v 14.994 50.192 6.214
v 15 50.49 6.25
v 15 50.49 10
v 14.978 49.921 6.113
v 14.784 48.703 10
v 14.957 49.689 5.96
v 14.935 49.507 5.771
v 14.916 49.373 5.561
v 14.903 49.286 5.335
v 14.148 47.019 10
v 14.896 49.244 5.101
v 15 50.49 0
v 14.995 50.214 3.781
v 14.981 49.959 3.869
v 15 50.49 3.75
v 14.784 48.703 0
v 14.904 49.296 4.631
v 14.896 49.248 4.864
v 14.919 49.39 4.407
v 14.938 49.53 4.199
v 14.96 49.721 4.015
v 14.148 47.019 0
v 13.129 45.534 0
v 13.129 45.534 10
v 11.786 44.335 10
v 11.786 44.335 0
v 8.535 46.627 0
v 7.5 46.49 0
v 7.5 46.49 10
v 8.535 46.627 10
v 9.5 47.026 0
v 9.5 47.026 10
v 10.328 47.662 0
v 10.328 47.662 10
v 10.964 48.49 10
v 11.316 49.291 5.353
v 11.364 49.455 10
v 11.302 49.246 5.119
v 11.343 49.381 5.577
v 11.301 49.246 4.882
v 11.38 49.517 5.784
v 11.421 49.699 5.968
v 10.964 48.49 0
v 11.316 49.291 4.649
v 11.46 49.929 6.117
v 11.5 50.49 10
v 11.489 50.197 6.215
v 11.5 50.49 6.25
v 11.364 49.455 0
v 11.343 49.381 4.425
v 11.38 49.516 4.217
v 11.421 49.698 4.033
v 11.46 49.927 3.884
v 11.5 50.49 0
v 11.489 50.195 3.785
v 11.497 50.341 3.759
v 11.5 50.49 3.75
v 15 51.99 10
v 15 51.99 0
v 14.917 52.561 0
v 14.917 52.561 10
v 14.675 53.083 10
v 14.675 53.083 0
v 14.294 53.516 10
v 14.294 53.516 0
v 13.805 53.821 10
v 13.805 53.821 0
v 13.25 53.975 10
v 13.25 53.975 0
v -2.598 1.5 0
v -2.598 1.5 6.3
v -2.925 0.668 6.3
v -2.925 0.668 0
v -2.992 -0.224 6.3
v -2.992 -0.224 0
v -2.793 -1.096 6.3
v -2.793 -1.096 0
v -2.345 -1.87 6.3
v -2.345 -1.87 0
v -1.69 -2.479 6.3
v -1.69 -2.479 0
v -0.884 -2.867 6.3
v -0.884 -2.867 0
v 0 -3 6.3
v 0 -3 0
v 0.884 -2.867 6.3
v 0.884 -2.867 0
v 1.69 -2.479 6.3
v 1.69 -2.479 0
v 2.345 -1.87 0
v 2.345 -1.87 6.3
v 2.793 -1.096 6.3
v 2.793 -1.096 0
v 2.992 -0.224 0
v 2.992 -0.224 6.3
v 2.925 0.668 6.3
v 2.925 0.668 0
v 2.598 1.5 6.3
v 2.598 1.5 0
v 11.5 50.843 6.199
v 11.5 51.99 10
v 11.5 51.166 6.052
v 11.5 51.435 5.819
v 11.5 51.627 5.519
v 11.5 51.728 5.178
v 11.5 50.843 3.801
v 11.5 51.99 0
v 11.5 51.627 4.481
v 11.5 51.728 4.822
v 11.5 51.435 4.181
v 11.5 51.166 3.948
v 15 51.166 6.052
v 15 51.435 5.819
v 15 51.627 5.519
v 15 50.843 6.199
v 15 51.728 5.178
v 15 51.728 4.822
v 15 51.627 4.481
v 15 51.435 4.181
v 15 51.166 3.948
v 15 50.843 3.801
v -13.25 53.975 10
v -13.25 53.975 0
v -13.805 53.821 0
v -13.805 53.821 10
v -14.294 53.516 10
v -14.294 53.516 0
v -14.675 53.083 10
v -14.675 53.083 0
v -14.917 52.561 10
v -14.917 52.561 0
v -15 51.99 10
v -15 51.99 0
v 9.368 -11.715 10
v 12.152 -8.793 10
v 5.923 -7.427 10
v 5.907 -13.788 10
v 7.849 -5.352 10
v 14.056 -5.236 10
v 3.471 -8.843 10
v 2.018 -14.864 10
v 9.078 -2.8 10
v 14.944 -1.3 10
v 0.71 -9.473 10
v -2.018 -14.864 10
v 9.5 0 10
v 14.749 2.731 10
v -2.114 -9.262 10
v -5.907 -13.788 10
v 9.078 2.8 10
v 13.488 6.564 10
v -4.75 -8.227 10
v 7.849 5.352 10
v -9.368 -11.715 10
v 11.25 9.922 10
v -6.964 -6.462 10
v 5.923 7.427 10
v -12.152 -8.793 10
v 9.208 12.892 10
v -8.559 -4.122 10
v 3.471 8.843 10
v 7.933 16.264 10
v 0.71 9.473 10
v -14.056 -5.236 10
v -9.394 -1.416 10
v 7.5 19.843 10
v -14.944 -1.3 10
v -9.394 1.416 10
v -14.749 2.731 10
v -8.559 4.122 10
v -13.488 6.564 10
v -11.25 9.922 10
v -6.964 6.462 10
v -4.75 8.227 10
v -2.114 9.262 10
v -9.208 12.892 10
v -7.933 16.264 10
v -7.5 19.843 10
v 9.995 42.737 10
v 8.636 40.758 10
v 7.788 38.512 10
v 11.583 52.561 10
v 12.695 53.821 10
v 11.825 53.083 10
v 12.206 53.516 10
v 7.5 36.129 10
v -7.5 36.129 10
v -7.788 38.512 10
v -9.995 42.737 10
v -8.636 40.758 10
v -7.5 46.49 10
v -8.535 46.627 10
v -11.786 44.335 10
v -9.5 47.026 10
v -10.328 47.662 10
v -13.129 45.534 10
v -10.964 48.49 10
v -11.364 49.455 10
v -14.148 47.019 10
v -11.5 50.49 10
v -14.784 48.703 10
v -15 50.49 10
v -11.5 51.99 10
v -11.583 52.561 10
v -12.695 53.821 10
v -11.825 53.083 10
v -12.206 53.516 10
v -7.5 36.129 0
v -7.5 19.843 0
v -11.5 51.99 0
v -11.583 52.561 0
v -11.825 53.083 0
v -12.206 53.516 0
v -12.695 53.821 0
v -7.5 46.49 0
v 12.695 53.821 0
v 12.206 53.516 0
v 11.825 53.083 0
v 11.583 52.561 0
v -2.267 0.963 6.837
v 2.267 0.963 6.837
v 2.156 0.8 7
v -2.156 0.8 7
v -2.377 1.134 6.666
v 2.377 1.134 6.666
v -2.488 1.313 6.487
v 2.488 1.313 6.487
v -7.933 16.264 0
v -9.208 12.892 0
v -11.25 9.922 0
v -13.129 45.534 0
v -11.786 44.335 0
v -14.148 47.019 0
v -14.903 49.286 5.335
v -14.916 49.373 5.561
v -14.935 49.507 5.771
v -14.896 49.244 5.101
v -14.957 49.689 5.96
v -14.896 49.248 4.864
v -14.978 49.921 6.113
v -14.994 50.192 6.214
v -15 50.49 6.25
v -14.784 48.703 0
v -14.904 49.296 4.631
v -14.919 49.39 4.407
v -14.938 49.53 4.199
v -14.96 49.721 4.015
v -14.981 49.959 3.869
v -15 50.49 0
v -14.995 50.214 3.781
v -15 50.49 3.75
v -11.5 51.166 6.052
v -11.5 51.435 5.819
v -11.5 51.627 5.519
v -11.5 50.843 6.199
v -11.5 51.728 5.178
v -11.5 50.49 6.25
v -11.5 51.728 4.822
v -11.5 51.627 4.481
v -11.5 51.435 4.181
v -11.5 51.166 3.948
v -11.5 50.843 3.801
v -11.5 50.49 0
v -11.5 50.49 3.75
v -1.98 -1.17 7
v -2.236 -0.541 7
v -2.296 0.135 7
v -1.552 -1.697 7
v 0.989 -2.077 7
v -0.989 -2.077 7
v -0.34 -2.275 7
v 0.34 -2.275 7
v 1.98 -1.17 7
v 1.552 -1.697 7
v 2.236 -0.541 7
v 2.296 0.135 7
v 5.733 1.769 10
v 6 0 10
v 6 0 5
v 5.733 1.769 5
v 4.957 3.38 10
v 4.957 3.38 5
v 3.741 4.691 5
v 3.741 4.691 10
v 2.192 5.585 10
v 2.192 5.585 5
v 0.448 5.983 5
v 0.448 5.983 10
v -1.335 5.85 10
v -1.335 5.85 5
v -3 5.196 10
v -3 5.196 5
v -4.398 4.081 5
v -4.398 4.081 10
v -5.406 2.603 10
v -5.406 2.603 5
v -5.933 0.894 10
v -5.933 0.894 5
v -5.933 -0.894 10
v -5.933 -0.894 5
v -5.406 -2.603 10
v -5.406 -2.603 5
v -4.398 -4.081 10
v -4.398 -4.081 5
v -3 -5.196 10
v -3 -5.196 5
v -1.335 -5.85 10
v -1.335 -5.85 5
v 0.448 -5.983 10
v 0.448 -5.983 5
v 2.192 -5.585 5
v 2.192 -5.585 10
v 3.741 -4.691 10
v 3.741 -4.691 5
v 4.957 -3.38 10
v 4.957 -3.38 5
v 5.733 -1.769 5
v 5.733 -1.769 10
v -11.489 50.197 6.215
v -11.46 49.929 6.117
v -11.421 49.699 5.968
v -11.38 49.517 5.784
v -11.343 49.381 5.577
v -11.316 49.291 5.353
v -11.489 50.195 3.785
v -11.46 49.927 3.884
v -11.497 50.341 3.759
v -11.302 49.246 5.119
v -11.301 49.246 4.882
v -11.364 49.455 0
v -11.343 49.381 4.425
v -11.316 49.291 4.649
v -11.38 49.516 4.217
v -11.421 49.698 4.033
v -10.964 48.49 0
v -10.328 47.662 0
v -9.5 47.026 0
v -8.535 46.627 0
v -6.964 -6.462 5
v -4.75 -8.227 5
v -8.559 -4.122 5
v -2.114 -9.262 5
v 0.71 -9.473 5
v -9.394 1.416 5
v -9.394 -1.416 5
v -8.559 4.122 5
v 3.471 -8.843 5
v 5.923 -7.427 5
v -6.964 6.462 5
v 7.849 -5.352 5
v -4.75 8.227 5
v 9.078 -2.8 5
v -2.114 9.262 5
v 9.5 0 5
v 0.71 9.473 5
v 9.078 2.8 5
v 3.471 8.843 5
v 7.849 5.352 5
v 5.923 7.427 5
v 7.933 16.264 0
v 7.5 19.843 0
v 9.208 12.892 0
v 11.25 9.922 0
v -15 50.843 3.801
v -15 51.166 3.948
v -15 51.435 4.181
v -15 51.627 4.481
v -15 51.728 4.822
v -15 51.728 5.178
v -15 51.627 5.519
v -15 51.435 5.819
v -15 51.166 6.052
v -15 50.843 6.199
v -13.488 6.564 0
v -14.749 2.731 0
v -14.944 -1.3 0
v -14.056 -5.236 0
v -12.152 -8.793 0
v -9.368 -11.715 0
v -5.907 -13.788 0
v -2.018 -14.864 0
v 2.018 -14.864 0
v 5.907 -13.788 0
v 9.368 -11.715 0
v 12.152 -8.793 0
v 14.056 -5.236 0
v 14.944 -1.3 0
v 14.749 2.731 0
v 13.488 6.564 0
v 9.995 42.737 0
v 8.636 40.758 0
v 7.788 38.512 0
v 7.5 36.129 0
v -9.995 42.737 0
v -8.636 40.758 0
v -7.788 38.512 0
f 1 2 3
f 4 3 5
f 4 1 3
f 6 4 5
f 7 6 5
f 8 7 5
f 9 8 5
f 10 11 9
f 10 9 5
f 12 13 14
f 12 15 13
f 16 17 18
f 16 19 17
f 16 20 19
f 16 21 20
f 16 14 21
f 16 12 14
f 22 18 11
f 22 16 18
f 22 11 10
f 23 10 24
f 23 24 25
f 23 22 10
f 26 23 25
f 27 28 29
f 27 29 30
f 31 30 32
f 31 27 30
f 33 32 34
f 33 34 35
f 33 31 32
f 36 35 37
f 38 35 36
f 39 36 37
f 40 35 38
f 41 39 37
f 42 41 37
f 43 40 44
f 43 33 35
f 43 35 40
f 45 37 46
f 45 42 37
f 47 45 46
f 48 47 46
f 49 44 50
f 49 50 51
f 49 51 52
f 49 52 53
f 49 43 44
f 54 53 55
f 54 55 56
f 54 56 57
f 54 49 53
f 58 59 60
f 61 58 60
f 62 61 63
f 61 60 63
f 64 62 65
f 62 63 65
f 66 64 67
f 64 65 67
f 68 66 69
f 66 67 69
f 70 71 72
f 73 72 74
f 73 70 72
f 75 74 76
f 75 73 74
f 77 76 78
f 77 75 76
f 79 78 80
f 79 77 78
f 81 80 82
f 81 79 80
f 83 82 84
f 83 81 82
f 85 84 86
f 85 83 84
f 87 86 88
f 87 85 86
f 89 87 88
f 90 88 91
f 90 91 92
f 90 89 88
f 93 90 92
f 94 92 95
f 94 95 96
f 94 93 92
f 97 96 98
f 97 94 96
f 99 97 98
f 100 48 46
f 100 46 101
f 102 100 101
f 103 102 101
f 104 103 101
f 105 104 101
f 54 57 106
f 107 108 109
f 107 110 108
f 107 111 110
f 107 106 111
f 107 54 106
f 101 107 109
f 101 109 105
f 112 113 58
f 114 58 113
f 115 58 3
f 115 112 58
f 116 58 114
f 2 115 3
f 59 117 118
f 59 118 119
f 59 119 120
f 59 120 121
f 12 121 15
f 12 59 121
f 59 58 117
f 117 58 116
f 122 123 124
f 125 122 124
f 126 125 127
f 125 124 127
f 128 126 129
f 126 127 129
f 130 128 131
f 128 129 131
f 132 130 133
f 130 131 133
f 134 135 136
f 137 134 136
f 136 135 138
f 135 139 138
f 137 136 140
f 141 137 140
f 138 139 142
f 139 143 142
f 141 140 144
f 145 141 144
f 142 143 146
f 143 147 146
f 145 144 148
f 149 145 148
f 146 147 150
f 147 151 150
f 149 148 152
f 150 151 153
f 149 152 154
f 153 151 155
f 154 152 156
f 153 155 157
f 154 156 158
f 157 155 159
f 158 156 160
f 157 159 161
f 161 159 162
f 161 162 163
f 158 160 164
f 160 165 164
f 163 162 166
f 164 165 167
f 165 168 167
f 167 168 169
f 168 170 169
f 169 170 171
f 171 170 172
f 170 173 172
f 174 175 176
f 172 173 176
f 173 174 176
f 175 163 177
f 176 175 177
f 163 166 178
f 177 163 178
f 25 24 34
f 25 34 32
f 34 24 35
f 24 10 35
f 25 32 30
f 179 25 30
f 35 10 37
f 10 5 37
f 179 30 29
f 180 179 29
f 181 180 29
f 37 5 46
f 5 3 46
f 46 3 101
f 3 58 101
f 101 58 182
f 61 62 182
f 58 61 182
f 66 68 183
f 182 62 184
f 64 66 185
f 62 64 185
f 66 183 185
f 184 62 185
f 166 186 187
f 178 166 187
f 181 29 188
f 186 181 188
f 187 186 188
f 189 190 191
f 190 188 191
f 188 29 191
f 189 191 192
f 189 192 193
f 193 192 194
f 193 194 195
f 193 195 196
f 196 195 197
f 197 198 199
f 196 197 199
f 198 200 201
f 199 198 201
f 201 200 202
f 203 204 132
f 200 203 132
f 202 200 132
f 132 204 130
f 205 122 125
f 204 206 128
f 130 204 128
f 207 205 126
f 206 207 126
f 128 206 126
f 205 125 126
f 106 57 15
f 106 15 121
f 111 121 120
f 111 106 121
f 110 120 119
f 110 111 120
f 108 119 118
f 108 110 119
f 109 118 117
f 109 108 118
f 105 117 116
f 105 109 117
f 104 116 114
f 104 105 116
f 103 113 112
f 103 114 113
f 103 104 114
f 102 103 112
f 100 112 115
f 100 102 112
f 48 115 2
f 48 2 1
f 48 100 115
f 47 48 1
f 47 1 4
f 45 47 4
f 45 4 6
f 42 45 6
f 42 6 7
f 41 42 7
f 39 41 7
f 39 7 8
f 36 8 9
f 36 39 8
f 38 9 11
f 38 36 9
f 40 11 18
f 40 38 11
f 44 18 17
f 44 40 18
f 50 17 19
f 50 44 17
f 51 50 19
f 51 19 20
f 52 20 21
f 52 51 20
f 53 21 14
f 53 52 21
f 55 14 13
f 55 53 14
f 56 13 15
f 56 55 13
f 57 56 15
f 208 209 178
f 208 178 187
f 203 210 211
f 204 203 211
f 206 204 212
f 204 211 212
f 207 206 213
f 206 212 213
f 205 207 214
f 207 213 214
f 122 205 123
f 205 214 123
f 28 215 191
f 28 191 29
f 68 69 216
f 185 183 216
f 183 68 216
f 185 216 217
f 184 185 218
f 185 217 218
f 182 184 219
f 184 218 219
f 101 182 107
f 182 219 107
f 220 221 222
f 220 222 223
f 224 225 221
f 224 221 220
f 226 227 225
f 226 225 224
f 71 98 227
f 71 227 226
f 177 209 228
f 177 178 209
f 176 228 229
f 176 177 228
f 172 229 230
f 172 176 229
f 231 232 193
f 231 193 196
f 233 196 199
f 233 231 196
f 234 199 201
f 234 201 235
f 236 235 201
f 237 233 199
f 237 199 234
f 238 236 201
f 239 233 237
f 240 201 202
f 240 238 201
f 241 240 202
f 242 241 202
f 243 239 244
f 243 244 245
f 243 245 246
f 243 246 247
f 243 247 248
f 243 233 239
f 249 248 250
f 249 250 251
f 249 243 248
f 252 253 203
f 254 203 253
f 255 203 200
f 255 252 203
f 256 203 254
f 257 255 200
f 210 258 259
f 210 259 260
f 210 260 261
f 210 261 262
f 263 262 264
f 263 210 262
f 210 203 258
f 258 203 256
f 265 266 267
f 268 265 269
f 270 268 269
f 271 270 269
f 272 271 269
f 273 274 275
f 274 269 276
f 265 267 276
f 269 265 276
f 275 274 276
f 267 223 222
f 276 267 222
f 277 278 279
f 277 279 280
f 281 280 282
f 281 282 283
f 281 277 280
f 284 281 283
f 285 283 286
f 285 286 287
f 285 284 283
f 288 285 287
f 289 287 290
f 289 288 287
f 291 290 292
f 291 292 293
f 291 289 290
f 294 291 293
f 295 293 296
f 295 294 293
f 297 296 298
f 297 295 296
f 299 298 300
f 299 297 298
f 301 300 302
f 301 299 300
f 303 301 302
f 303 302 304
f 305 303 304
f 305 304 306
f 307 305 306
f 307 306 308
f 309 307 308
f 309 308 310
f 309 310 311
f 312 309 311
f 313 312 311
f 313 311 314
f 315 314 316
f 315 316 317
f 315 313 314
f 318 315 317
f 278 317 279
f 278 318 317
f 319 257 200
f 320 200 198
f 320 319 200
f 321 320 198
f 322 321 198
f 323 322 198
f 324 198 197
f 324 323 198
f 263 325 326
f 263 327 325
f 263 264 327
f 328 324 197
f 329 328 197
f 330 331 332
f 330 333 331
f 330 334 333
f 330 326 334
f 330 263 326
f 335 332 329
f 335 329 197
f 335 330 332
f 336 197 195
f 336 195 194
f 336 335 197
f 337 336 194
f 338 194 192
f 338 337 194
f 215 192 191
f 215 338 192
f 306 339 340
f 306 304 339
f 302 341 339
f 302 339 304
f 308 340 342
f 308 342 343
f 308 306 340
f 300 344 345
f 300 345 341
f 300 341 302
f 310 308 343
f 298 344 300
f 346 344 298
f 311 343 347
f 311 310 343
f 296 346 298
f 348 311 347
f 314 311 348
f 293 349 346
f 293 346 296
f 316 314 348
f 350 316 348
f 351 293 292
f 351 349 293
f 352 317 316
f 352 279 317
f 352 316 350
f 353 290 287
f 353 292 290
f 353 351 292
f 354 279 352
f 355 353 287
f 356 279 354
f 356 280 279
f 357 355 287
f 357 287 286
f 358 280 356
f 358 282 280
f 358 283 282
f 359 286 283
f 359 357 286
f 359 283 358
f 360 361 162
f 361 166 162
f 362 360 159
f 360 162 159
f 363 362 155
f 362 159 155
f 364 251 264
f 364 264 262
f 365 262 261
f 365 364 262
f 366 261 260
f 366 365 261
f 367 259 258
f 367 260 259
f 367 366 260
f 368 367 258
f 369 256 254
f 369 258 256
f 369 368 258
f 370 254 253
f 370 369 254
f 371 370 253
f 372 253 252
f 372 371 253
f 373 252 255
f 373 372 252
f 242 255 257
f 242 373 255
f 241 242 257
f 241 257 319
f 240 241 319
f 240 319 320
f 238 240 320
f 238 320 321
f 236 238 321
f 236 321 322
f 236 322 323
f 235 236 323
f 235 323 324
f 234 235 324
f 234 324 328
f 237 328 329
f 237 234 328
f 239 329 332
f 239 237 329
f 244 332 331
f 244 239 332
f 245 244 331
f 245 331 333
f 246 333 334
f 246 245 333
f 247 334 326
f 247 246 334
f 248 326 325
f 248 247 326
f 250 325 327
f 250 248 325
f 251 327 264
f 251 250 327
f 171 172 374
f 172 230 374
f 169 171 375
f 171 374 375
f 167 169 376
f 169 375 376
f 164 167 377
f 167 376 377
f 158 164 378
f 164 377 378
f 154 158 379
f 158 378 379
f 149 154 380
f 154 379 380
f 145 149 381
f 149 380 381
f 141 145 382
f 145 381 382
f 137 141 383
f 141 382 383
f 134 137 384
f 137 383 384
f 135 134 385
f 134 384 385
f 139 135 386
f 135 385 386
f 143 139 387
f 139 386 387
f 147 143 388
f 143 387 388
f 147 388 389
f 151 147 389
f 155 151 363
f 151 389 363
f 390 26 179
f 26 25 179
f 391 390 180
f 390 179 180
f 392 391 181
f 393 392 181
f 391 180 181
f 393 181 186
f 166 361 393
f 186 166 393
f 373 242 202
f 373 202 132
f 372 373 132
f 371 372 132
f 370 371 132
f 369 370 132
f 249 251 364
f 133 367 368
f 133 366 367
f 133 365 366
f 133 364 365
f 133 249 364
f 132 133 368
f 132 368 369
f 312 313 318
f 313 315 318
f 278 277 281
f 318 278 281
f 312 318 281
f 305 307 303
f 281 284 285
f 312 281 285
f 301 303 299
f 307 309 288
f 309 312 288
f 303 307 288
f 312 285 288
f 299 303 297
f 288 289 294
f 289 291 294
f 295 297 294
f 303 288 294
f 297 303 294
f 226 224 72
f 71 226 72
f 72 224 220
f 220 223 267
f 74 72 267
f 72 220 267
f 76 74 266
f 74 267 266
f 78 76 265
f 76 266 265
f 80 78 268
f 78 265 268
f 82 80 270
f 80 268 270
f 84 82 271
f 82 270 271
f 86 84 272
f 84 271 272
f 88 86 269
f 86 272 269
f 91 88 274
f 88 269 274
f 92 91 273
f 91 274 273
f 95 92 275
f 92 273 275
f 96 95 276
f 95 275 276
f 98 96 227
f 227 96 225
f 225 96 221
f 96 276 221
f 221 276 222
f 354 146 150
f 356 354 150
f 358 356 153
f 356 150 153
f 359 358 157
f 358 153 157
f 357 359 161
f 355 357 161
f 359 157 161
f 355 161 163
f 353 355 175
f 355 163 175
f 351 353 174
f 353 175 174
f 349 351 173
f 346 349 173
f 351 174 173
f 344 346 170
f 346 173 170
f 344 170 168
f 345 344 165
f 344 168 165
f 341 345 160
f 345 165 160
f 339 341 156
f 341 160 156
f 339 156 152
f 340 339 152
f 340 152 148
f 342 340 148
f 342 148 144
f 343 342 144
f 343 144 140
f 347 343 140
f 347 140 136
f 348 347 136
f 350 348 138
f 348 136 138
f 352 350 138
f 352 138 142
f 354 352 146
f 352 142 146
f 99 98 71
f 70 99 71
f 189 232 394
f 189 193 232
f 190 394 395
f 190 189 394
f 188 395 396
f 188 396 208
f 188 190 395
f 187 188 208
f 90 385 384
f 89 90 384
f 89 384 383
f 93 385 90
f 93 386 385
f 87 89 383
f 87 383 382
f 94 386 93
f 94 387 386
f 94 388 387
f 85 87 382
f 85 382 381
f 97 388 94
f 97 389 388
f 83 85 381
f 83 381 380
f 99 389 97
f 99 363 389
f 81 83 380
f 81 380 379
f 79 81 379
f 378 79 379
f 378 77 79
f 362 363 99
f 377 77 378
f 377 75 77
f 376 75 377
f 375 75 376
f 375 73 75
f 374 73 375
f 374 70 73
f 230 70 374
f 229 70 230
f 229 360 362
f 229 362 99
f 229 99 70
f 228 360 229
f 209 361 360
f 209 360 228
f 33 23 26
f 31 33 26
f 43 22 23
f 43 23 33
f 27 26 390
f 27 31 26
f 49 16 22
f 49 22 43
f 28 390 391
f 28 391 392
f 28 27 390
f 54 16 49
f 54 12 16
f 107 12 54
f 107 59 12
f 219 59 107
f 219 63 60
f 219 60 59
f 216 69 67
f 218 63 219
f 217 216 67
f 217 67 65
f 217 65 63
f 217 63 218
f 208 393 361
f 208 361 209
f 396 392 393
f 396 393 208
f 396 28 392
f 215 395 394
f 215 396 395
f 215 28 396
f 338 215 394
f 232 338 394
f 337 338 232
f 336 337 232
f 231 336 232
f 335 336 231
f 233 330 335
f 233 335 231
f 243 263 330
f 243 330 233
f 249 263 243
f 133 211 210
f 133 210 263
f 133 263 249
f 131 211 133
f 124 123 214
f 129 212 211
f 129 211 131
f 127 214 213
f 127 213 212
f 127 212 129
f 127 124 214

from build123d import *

# Parameters (mm, degrees)
SKETCH1_R               = 15
SKETCH1_R_2             = 3
BOSS_EXTRUDE1_DEPTH     = 10
SKETCH2_W               = 15
SKETCH2_H               = 30
BOSS_EXTRUDE2_DEPTH     = 10
FILLET1_R               = 15
SKETCH5_W               = 10
SKETCH5_H               = 2
BOSS_EXTRUDE3_DEPTH     = 10
BOSS_EXTRUDE4_START     = -3
SKETCH7_R               = 3
BOSS_EXTRUDE4_DEPTH     = 3
CHAMFER1_SIZE           = 0.7
BOSS_EXTRUDE6_DEPTH     = 10
FILLET4_R               = 2
FILLET2_R               = 10
CUT_EXTRUDE1_DEPTH      = 63.556116013
CUT_EXTRUDE1_DEPTH_BACK = 63.556116013
SKETCH10_R              = 1.25
SKETCH11_R              = 9.5
SKETCH11_R_2            = 6
CUT_EXTRUDE2_DEPTH      = 5


with BuildPart() as part:
    # Sketch1 → Boss-Extrude1 (new body)
    with BuildSketch(Plane.XY):
        Circle(SKETCH1_R)
        Circle(SKETCH1_R_2, mode=Mode.SUBTRACT)
    extrude(amount=BOSS_EXTRUDE1_DEPTH)

    # Sketch2 → Boss-Extrude2 (add)
    with BuildSketch(Plane.XY):
        with Locations((0, 27.990381057)):
            Rectangle(SKETCH2_W, SKETCH2_H)
    extrude(amount=BOSS_EXTRUDE2_DEPTH)

    # Fillet1
    fillet1_edges = [part.edges().sort_by_distance(p)[0] for p in [
        (-7.5, 12.990381057, 5),
        (7.5, 12.990381057, 5),
    ]]
    fillet(fillet1_edges, radius=FILLET1_R)

    # Sketch5 → Boss-Extrude3 (add)
    with BuildSketch(Plane(origin=(0, 0, 0), x_dir=(-1, 0, 0), z_dir=(0, 0, -1))):
        with Locations((0, 2.5)):
            Rectangle(SKETCH5_W, SKETCH5_H)
    extrude(amount=-BOSS_EXTRUDE3_DEPTH)

    # Sketch7 → Boss-Extrude4 (add)
    with BuildSketch(Plane.XY.offset(10).offset(BOSS_EXTRUDE4_START)):
        Circle(SKETCH7_R)
    extrude(amount=BOSS_EXTRUDE4_DEPTH)

    # Chamfer1
    chamfer1_edges = [part.edges().sort_by_distance(p)[0] for p in [
        (0, 1.5, 7),
        (0, -3, 7),
    ]]
    chamfer(chamfer1_edges, length=CHAMFER1_SIZE)

    # Sketch9 → Boss-Extrude6 (add)
    with BuildSketch(Plane(origin=(0, 0, 0), x_dir=(-1, 0, 0), z_dir=(0, 0, -1))):
        with BuildLine():
            Line((-15, 53.990381057), (-15, 50.490381057))
            ThreePointArc((-15, 50.490381057), (-12.803300859, 45.187080198), (-7.5, 42.990381057))
            Line((-7.5, 42.990381057), (0, 42.990381057))
            Line((0, 42.990381057), (0, 46.490381057))
            Line((0, 46.490381057), (-7.5, 46.490381057))
            ThreePointArc((-7.5, 46.490381057), (-10.328427125, 47.661953932), (-11.5, 50.490381057))
            Line((-11.5, 50.490381057), (-11.5, 53.990381057))
            Line((-11.5, 53.990381057), (-15, 53.990381057))
        make_face()
        with BuildLine():
            Line((0, 46.490381057), (0, 42.990381057))
            Line((0, 42.990381057), (7.5, 42.990381057))
            ThreePointArc((7.5, 42.990381057), (12.803300859, 45.187080198), (15, 50.490381057))
            Line((15, 50.490381057), (15, 53.990381057))
            Line((15, 53.990381057), (11.5, 53.990381057))
            Line((11.5, 53.990381057), (11.5, 50.490381057))
            ThreePointArc((11.5, 50.490381057), (10.328427125, 47.661953932), (7.5, 46.490381057))
            Line((7.5, 46.490381057), (0, 46.490381057))
        make_face()
    extrude(amount=-BOSS_EXTRUDE6_DEPTH)

    # Fillet4
    # the kernel refuses this fillet: 2 mm, written as the material it takes off along each edge
    with BuildSketch(Plane(origin=(11.5, 53.990381057, -5), x_dir=(0, -1, 0), z_dir=(0, 0, 1)), Plane(origin=(15, 53.990381057, -5), x_dir=(-1, 0, 0), z_dir=(0, 0, 1)), Plane(origin=(-11.5, 53.990381057, -5), x_dir=(-1, 0, 0), z_dir=(0, 0, 1)), Plane(origin=(-15, 53.990381057, -5), x_dir=(0, -1, 0), z_dir=(0, 0, 1))) as fillet4_piece_1:
        with BuildLine():
            CenterArc((FILLET4_R, FILLET4_R), FILLET4_R, 180, 90)
            Line((0, FILLET4_R), (0, 0))
            Line((0, 0), (FILLET4_R, 0))
        make_face()
    extrude(amount=20, mode=Mode.SUBTRACT)

    # Fillet2
    fillet2_edges = [part.edges().sort_by_distance(p)[0] for p in [
        (-7.5, 42.990381057, 5),
        (7.5, 42.990381057, 5),
    ]]
    fillet(fillet2_edges, radius=FILLET2_R)

    # Sketch10 → Cut-Extrude1 (cut, two sides: drawn at the far end of the back side and taken through both)
    with BuildSketch(Plane(origin=(15, 0, 0), x_dir=(0, 0, -1), z_dir=(1, 0, 0)).offset(-CUT_EXTRUDE1_DEPTH_BACK)):
        with Locations((-5, 50.490381057)):
            Circle(SKETCH10_R)
    extrude(amount=CUT_EXTRUDE1_DEPTH + CUT_EXTRUDE1_DEPTH_BACK, mode=Mode.SUBTRACT)

    # Sketch11 → Cut-Extrude2 (cut)
    with BuildSketch(Plane.XY.offset(10)):
        Circle(SKETCH11_R)
        Circle(SKETCH11_R_2, mode=Mode.SUBTRACT)
    extrude(amount=-CUT_EXTRUDE2_DEPTH, mode=Mode.SUBTRACT)


solid = part.part
